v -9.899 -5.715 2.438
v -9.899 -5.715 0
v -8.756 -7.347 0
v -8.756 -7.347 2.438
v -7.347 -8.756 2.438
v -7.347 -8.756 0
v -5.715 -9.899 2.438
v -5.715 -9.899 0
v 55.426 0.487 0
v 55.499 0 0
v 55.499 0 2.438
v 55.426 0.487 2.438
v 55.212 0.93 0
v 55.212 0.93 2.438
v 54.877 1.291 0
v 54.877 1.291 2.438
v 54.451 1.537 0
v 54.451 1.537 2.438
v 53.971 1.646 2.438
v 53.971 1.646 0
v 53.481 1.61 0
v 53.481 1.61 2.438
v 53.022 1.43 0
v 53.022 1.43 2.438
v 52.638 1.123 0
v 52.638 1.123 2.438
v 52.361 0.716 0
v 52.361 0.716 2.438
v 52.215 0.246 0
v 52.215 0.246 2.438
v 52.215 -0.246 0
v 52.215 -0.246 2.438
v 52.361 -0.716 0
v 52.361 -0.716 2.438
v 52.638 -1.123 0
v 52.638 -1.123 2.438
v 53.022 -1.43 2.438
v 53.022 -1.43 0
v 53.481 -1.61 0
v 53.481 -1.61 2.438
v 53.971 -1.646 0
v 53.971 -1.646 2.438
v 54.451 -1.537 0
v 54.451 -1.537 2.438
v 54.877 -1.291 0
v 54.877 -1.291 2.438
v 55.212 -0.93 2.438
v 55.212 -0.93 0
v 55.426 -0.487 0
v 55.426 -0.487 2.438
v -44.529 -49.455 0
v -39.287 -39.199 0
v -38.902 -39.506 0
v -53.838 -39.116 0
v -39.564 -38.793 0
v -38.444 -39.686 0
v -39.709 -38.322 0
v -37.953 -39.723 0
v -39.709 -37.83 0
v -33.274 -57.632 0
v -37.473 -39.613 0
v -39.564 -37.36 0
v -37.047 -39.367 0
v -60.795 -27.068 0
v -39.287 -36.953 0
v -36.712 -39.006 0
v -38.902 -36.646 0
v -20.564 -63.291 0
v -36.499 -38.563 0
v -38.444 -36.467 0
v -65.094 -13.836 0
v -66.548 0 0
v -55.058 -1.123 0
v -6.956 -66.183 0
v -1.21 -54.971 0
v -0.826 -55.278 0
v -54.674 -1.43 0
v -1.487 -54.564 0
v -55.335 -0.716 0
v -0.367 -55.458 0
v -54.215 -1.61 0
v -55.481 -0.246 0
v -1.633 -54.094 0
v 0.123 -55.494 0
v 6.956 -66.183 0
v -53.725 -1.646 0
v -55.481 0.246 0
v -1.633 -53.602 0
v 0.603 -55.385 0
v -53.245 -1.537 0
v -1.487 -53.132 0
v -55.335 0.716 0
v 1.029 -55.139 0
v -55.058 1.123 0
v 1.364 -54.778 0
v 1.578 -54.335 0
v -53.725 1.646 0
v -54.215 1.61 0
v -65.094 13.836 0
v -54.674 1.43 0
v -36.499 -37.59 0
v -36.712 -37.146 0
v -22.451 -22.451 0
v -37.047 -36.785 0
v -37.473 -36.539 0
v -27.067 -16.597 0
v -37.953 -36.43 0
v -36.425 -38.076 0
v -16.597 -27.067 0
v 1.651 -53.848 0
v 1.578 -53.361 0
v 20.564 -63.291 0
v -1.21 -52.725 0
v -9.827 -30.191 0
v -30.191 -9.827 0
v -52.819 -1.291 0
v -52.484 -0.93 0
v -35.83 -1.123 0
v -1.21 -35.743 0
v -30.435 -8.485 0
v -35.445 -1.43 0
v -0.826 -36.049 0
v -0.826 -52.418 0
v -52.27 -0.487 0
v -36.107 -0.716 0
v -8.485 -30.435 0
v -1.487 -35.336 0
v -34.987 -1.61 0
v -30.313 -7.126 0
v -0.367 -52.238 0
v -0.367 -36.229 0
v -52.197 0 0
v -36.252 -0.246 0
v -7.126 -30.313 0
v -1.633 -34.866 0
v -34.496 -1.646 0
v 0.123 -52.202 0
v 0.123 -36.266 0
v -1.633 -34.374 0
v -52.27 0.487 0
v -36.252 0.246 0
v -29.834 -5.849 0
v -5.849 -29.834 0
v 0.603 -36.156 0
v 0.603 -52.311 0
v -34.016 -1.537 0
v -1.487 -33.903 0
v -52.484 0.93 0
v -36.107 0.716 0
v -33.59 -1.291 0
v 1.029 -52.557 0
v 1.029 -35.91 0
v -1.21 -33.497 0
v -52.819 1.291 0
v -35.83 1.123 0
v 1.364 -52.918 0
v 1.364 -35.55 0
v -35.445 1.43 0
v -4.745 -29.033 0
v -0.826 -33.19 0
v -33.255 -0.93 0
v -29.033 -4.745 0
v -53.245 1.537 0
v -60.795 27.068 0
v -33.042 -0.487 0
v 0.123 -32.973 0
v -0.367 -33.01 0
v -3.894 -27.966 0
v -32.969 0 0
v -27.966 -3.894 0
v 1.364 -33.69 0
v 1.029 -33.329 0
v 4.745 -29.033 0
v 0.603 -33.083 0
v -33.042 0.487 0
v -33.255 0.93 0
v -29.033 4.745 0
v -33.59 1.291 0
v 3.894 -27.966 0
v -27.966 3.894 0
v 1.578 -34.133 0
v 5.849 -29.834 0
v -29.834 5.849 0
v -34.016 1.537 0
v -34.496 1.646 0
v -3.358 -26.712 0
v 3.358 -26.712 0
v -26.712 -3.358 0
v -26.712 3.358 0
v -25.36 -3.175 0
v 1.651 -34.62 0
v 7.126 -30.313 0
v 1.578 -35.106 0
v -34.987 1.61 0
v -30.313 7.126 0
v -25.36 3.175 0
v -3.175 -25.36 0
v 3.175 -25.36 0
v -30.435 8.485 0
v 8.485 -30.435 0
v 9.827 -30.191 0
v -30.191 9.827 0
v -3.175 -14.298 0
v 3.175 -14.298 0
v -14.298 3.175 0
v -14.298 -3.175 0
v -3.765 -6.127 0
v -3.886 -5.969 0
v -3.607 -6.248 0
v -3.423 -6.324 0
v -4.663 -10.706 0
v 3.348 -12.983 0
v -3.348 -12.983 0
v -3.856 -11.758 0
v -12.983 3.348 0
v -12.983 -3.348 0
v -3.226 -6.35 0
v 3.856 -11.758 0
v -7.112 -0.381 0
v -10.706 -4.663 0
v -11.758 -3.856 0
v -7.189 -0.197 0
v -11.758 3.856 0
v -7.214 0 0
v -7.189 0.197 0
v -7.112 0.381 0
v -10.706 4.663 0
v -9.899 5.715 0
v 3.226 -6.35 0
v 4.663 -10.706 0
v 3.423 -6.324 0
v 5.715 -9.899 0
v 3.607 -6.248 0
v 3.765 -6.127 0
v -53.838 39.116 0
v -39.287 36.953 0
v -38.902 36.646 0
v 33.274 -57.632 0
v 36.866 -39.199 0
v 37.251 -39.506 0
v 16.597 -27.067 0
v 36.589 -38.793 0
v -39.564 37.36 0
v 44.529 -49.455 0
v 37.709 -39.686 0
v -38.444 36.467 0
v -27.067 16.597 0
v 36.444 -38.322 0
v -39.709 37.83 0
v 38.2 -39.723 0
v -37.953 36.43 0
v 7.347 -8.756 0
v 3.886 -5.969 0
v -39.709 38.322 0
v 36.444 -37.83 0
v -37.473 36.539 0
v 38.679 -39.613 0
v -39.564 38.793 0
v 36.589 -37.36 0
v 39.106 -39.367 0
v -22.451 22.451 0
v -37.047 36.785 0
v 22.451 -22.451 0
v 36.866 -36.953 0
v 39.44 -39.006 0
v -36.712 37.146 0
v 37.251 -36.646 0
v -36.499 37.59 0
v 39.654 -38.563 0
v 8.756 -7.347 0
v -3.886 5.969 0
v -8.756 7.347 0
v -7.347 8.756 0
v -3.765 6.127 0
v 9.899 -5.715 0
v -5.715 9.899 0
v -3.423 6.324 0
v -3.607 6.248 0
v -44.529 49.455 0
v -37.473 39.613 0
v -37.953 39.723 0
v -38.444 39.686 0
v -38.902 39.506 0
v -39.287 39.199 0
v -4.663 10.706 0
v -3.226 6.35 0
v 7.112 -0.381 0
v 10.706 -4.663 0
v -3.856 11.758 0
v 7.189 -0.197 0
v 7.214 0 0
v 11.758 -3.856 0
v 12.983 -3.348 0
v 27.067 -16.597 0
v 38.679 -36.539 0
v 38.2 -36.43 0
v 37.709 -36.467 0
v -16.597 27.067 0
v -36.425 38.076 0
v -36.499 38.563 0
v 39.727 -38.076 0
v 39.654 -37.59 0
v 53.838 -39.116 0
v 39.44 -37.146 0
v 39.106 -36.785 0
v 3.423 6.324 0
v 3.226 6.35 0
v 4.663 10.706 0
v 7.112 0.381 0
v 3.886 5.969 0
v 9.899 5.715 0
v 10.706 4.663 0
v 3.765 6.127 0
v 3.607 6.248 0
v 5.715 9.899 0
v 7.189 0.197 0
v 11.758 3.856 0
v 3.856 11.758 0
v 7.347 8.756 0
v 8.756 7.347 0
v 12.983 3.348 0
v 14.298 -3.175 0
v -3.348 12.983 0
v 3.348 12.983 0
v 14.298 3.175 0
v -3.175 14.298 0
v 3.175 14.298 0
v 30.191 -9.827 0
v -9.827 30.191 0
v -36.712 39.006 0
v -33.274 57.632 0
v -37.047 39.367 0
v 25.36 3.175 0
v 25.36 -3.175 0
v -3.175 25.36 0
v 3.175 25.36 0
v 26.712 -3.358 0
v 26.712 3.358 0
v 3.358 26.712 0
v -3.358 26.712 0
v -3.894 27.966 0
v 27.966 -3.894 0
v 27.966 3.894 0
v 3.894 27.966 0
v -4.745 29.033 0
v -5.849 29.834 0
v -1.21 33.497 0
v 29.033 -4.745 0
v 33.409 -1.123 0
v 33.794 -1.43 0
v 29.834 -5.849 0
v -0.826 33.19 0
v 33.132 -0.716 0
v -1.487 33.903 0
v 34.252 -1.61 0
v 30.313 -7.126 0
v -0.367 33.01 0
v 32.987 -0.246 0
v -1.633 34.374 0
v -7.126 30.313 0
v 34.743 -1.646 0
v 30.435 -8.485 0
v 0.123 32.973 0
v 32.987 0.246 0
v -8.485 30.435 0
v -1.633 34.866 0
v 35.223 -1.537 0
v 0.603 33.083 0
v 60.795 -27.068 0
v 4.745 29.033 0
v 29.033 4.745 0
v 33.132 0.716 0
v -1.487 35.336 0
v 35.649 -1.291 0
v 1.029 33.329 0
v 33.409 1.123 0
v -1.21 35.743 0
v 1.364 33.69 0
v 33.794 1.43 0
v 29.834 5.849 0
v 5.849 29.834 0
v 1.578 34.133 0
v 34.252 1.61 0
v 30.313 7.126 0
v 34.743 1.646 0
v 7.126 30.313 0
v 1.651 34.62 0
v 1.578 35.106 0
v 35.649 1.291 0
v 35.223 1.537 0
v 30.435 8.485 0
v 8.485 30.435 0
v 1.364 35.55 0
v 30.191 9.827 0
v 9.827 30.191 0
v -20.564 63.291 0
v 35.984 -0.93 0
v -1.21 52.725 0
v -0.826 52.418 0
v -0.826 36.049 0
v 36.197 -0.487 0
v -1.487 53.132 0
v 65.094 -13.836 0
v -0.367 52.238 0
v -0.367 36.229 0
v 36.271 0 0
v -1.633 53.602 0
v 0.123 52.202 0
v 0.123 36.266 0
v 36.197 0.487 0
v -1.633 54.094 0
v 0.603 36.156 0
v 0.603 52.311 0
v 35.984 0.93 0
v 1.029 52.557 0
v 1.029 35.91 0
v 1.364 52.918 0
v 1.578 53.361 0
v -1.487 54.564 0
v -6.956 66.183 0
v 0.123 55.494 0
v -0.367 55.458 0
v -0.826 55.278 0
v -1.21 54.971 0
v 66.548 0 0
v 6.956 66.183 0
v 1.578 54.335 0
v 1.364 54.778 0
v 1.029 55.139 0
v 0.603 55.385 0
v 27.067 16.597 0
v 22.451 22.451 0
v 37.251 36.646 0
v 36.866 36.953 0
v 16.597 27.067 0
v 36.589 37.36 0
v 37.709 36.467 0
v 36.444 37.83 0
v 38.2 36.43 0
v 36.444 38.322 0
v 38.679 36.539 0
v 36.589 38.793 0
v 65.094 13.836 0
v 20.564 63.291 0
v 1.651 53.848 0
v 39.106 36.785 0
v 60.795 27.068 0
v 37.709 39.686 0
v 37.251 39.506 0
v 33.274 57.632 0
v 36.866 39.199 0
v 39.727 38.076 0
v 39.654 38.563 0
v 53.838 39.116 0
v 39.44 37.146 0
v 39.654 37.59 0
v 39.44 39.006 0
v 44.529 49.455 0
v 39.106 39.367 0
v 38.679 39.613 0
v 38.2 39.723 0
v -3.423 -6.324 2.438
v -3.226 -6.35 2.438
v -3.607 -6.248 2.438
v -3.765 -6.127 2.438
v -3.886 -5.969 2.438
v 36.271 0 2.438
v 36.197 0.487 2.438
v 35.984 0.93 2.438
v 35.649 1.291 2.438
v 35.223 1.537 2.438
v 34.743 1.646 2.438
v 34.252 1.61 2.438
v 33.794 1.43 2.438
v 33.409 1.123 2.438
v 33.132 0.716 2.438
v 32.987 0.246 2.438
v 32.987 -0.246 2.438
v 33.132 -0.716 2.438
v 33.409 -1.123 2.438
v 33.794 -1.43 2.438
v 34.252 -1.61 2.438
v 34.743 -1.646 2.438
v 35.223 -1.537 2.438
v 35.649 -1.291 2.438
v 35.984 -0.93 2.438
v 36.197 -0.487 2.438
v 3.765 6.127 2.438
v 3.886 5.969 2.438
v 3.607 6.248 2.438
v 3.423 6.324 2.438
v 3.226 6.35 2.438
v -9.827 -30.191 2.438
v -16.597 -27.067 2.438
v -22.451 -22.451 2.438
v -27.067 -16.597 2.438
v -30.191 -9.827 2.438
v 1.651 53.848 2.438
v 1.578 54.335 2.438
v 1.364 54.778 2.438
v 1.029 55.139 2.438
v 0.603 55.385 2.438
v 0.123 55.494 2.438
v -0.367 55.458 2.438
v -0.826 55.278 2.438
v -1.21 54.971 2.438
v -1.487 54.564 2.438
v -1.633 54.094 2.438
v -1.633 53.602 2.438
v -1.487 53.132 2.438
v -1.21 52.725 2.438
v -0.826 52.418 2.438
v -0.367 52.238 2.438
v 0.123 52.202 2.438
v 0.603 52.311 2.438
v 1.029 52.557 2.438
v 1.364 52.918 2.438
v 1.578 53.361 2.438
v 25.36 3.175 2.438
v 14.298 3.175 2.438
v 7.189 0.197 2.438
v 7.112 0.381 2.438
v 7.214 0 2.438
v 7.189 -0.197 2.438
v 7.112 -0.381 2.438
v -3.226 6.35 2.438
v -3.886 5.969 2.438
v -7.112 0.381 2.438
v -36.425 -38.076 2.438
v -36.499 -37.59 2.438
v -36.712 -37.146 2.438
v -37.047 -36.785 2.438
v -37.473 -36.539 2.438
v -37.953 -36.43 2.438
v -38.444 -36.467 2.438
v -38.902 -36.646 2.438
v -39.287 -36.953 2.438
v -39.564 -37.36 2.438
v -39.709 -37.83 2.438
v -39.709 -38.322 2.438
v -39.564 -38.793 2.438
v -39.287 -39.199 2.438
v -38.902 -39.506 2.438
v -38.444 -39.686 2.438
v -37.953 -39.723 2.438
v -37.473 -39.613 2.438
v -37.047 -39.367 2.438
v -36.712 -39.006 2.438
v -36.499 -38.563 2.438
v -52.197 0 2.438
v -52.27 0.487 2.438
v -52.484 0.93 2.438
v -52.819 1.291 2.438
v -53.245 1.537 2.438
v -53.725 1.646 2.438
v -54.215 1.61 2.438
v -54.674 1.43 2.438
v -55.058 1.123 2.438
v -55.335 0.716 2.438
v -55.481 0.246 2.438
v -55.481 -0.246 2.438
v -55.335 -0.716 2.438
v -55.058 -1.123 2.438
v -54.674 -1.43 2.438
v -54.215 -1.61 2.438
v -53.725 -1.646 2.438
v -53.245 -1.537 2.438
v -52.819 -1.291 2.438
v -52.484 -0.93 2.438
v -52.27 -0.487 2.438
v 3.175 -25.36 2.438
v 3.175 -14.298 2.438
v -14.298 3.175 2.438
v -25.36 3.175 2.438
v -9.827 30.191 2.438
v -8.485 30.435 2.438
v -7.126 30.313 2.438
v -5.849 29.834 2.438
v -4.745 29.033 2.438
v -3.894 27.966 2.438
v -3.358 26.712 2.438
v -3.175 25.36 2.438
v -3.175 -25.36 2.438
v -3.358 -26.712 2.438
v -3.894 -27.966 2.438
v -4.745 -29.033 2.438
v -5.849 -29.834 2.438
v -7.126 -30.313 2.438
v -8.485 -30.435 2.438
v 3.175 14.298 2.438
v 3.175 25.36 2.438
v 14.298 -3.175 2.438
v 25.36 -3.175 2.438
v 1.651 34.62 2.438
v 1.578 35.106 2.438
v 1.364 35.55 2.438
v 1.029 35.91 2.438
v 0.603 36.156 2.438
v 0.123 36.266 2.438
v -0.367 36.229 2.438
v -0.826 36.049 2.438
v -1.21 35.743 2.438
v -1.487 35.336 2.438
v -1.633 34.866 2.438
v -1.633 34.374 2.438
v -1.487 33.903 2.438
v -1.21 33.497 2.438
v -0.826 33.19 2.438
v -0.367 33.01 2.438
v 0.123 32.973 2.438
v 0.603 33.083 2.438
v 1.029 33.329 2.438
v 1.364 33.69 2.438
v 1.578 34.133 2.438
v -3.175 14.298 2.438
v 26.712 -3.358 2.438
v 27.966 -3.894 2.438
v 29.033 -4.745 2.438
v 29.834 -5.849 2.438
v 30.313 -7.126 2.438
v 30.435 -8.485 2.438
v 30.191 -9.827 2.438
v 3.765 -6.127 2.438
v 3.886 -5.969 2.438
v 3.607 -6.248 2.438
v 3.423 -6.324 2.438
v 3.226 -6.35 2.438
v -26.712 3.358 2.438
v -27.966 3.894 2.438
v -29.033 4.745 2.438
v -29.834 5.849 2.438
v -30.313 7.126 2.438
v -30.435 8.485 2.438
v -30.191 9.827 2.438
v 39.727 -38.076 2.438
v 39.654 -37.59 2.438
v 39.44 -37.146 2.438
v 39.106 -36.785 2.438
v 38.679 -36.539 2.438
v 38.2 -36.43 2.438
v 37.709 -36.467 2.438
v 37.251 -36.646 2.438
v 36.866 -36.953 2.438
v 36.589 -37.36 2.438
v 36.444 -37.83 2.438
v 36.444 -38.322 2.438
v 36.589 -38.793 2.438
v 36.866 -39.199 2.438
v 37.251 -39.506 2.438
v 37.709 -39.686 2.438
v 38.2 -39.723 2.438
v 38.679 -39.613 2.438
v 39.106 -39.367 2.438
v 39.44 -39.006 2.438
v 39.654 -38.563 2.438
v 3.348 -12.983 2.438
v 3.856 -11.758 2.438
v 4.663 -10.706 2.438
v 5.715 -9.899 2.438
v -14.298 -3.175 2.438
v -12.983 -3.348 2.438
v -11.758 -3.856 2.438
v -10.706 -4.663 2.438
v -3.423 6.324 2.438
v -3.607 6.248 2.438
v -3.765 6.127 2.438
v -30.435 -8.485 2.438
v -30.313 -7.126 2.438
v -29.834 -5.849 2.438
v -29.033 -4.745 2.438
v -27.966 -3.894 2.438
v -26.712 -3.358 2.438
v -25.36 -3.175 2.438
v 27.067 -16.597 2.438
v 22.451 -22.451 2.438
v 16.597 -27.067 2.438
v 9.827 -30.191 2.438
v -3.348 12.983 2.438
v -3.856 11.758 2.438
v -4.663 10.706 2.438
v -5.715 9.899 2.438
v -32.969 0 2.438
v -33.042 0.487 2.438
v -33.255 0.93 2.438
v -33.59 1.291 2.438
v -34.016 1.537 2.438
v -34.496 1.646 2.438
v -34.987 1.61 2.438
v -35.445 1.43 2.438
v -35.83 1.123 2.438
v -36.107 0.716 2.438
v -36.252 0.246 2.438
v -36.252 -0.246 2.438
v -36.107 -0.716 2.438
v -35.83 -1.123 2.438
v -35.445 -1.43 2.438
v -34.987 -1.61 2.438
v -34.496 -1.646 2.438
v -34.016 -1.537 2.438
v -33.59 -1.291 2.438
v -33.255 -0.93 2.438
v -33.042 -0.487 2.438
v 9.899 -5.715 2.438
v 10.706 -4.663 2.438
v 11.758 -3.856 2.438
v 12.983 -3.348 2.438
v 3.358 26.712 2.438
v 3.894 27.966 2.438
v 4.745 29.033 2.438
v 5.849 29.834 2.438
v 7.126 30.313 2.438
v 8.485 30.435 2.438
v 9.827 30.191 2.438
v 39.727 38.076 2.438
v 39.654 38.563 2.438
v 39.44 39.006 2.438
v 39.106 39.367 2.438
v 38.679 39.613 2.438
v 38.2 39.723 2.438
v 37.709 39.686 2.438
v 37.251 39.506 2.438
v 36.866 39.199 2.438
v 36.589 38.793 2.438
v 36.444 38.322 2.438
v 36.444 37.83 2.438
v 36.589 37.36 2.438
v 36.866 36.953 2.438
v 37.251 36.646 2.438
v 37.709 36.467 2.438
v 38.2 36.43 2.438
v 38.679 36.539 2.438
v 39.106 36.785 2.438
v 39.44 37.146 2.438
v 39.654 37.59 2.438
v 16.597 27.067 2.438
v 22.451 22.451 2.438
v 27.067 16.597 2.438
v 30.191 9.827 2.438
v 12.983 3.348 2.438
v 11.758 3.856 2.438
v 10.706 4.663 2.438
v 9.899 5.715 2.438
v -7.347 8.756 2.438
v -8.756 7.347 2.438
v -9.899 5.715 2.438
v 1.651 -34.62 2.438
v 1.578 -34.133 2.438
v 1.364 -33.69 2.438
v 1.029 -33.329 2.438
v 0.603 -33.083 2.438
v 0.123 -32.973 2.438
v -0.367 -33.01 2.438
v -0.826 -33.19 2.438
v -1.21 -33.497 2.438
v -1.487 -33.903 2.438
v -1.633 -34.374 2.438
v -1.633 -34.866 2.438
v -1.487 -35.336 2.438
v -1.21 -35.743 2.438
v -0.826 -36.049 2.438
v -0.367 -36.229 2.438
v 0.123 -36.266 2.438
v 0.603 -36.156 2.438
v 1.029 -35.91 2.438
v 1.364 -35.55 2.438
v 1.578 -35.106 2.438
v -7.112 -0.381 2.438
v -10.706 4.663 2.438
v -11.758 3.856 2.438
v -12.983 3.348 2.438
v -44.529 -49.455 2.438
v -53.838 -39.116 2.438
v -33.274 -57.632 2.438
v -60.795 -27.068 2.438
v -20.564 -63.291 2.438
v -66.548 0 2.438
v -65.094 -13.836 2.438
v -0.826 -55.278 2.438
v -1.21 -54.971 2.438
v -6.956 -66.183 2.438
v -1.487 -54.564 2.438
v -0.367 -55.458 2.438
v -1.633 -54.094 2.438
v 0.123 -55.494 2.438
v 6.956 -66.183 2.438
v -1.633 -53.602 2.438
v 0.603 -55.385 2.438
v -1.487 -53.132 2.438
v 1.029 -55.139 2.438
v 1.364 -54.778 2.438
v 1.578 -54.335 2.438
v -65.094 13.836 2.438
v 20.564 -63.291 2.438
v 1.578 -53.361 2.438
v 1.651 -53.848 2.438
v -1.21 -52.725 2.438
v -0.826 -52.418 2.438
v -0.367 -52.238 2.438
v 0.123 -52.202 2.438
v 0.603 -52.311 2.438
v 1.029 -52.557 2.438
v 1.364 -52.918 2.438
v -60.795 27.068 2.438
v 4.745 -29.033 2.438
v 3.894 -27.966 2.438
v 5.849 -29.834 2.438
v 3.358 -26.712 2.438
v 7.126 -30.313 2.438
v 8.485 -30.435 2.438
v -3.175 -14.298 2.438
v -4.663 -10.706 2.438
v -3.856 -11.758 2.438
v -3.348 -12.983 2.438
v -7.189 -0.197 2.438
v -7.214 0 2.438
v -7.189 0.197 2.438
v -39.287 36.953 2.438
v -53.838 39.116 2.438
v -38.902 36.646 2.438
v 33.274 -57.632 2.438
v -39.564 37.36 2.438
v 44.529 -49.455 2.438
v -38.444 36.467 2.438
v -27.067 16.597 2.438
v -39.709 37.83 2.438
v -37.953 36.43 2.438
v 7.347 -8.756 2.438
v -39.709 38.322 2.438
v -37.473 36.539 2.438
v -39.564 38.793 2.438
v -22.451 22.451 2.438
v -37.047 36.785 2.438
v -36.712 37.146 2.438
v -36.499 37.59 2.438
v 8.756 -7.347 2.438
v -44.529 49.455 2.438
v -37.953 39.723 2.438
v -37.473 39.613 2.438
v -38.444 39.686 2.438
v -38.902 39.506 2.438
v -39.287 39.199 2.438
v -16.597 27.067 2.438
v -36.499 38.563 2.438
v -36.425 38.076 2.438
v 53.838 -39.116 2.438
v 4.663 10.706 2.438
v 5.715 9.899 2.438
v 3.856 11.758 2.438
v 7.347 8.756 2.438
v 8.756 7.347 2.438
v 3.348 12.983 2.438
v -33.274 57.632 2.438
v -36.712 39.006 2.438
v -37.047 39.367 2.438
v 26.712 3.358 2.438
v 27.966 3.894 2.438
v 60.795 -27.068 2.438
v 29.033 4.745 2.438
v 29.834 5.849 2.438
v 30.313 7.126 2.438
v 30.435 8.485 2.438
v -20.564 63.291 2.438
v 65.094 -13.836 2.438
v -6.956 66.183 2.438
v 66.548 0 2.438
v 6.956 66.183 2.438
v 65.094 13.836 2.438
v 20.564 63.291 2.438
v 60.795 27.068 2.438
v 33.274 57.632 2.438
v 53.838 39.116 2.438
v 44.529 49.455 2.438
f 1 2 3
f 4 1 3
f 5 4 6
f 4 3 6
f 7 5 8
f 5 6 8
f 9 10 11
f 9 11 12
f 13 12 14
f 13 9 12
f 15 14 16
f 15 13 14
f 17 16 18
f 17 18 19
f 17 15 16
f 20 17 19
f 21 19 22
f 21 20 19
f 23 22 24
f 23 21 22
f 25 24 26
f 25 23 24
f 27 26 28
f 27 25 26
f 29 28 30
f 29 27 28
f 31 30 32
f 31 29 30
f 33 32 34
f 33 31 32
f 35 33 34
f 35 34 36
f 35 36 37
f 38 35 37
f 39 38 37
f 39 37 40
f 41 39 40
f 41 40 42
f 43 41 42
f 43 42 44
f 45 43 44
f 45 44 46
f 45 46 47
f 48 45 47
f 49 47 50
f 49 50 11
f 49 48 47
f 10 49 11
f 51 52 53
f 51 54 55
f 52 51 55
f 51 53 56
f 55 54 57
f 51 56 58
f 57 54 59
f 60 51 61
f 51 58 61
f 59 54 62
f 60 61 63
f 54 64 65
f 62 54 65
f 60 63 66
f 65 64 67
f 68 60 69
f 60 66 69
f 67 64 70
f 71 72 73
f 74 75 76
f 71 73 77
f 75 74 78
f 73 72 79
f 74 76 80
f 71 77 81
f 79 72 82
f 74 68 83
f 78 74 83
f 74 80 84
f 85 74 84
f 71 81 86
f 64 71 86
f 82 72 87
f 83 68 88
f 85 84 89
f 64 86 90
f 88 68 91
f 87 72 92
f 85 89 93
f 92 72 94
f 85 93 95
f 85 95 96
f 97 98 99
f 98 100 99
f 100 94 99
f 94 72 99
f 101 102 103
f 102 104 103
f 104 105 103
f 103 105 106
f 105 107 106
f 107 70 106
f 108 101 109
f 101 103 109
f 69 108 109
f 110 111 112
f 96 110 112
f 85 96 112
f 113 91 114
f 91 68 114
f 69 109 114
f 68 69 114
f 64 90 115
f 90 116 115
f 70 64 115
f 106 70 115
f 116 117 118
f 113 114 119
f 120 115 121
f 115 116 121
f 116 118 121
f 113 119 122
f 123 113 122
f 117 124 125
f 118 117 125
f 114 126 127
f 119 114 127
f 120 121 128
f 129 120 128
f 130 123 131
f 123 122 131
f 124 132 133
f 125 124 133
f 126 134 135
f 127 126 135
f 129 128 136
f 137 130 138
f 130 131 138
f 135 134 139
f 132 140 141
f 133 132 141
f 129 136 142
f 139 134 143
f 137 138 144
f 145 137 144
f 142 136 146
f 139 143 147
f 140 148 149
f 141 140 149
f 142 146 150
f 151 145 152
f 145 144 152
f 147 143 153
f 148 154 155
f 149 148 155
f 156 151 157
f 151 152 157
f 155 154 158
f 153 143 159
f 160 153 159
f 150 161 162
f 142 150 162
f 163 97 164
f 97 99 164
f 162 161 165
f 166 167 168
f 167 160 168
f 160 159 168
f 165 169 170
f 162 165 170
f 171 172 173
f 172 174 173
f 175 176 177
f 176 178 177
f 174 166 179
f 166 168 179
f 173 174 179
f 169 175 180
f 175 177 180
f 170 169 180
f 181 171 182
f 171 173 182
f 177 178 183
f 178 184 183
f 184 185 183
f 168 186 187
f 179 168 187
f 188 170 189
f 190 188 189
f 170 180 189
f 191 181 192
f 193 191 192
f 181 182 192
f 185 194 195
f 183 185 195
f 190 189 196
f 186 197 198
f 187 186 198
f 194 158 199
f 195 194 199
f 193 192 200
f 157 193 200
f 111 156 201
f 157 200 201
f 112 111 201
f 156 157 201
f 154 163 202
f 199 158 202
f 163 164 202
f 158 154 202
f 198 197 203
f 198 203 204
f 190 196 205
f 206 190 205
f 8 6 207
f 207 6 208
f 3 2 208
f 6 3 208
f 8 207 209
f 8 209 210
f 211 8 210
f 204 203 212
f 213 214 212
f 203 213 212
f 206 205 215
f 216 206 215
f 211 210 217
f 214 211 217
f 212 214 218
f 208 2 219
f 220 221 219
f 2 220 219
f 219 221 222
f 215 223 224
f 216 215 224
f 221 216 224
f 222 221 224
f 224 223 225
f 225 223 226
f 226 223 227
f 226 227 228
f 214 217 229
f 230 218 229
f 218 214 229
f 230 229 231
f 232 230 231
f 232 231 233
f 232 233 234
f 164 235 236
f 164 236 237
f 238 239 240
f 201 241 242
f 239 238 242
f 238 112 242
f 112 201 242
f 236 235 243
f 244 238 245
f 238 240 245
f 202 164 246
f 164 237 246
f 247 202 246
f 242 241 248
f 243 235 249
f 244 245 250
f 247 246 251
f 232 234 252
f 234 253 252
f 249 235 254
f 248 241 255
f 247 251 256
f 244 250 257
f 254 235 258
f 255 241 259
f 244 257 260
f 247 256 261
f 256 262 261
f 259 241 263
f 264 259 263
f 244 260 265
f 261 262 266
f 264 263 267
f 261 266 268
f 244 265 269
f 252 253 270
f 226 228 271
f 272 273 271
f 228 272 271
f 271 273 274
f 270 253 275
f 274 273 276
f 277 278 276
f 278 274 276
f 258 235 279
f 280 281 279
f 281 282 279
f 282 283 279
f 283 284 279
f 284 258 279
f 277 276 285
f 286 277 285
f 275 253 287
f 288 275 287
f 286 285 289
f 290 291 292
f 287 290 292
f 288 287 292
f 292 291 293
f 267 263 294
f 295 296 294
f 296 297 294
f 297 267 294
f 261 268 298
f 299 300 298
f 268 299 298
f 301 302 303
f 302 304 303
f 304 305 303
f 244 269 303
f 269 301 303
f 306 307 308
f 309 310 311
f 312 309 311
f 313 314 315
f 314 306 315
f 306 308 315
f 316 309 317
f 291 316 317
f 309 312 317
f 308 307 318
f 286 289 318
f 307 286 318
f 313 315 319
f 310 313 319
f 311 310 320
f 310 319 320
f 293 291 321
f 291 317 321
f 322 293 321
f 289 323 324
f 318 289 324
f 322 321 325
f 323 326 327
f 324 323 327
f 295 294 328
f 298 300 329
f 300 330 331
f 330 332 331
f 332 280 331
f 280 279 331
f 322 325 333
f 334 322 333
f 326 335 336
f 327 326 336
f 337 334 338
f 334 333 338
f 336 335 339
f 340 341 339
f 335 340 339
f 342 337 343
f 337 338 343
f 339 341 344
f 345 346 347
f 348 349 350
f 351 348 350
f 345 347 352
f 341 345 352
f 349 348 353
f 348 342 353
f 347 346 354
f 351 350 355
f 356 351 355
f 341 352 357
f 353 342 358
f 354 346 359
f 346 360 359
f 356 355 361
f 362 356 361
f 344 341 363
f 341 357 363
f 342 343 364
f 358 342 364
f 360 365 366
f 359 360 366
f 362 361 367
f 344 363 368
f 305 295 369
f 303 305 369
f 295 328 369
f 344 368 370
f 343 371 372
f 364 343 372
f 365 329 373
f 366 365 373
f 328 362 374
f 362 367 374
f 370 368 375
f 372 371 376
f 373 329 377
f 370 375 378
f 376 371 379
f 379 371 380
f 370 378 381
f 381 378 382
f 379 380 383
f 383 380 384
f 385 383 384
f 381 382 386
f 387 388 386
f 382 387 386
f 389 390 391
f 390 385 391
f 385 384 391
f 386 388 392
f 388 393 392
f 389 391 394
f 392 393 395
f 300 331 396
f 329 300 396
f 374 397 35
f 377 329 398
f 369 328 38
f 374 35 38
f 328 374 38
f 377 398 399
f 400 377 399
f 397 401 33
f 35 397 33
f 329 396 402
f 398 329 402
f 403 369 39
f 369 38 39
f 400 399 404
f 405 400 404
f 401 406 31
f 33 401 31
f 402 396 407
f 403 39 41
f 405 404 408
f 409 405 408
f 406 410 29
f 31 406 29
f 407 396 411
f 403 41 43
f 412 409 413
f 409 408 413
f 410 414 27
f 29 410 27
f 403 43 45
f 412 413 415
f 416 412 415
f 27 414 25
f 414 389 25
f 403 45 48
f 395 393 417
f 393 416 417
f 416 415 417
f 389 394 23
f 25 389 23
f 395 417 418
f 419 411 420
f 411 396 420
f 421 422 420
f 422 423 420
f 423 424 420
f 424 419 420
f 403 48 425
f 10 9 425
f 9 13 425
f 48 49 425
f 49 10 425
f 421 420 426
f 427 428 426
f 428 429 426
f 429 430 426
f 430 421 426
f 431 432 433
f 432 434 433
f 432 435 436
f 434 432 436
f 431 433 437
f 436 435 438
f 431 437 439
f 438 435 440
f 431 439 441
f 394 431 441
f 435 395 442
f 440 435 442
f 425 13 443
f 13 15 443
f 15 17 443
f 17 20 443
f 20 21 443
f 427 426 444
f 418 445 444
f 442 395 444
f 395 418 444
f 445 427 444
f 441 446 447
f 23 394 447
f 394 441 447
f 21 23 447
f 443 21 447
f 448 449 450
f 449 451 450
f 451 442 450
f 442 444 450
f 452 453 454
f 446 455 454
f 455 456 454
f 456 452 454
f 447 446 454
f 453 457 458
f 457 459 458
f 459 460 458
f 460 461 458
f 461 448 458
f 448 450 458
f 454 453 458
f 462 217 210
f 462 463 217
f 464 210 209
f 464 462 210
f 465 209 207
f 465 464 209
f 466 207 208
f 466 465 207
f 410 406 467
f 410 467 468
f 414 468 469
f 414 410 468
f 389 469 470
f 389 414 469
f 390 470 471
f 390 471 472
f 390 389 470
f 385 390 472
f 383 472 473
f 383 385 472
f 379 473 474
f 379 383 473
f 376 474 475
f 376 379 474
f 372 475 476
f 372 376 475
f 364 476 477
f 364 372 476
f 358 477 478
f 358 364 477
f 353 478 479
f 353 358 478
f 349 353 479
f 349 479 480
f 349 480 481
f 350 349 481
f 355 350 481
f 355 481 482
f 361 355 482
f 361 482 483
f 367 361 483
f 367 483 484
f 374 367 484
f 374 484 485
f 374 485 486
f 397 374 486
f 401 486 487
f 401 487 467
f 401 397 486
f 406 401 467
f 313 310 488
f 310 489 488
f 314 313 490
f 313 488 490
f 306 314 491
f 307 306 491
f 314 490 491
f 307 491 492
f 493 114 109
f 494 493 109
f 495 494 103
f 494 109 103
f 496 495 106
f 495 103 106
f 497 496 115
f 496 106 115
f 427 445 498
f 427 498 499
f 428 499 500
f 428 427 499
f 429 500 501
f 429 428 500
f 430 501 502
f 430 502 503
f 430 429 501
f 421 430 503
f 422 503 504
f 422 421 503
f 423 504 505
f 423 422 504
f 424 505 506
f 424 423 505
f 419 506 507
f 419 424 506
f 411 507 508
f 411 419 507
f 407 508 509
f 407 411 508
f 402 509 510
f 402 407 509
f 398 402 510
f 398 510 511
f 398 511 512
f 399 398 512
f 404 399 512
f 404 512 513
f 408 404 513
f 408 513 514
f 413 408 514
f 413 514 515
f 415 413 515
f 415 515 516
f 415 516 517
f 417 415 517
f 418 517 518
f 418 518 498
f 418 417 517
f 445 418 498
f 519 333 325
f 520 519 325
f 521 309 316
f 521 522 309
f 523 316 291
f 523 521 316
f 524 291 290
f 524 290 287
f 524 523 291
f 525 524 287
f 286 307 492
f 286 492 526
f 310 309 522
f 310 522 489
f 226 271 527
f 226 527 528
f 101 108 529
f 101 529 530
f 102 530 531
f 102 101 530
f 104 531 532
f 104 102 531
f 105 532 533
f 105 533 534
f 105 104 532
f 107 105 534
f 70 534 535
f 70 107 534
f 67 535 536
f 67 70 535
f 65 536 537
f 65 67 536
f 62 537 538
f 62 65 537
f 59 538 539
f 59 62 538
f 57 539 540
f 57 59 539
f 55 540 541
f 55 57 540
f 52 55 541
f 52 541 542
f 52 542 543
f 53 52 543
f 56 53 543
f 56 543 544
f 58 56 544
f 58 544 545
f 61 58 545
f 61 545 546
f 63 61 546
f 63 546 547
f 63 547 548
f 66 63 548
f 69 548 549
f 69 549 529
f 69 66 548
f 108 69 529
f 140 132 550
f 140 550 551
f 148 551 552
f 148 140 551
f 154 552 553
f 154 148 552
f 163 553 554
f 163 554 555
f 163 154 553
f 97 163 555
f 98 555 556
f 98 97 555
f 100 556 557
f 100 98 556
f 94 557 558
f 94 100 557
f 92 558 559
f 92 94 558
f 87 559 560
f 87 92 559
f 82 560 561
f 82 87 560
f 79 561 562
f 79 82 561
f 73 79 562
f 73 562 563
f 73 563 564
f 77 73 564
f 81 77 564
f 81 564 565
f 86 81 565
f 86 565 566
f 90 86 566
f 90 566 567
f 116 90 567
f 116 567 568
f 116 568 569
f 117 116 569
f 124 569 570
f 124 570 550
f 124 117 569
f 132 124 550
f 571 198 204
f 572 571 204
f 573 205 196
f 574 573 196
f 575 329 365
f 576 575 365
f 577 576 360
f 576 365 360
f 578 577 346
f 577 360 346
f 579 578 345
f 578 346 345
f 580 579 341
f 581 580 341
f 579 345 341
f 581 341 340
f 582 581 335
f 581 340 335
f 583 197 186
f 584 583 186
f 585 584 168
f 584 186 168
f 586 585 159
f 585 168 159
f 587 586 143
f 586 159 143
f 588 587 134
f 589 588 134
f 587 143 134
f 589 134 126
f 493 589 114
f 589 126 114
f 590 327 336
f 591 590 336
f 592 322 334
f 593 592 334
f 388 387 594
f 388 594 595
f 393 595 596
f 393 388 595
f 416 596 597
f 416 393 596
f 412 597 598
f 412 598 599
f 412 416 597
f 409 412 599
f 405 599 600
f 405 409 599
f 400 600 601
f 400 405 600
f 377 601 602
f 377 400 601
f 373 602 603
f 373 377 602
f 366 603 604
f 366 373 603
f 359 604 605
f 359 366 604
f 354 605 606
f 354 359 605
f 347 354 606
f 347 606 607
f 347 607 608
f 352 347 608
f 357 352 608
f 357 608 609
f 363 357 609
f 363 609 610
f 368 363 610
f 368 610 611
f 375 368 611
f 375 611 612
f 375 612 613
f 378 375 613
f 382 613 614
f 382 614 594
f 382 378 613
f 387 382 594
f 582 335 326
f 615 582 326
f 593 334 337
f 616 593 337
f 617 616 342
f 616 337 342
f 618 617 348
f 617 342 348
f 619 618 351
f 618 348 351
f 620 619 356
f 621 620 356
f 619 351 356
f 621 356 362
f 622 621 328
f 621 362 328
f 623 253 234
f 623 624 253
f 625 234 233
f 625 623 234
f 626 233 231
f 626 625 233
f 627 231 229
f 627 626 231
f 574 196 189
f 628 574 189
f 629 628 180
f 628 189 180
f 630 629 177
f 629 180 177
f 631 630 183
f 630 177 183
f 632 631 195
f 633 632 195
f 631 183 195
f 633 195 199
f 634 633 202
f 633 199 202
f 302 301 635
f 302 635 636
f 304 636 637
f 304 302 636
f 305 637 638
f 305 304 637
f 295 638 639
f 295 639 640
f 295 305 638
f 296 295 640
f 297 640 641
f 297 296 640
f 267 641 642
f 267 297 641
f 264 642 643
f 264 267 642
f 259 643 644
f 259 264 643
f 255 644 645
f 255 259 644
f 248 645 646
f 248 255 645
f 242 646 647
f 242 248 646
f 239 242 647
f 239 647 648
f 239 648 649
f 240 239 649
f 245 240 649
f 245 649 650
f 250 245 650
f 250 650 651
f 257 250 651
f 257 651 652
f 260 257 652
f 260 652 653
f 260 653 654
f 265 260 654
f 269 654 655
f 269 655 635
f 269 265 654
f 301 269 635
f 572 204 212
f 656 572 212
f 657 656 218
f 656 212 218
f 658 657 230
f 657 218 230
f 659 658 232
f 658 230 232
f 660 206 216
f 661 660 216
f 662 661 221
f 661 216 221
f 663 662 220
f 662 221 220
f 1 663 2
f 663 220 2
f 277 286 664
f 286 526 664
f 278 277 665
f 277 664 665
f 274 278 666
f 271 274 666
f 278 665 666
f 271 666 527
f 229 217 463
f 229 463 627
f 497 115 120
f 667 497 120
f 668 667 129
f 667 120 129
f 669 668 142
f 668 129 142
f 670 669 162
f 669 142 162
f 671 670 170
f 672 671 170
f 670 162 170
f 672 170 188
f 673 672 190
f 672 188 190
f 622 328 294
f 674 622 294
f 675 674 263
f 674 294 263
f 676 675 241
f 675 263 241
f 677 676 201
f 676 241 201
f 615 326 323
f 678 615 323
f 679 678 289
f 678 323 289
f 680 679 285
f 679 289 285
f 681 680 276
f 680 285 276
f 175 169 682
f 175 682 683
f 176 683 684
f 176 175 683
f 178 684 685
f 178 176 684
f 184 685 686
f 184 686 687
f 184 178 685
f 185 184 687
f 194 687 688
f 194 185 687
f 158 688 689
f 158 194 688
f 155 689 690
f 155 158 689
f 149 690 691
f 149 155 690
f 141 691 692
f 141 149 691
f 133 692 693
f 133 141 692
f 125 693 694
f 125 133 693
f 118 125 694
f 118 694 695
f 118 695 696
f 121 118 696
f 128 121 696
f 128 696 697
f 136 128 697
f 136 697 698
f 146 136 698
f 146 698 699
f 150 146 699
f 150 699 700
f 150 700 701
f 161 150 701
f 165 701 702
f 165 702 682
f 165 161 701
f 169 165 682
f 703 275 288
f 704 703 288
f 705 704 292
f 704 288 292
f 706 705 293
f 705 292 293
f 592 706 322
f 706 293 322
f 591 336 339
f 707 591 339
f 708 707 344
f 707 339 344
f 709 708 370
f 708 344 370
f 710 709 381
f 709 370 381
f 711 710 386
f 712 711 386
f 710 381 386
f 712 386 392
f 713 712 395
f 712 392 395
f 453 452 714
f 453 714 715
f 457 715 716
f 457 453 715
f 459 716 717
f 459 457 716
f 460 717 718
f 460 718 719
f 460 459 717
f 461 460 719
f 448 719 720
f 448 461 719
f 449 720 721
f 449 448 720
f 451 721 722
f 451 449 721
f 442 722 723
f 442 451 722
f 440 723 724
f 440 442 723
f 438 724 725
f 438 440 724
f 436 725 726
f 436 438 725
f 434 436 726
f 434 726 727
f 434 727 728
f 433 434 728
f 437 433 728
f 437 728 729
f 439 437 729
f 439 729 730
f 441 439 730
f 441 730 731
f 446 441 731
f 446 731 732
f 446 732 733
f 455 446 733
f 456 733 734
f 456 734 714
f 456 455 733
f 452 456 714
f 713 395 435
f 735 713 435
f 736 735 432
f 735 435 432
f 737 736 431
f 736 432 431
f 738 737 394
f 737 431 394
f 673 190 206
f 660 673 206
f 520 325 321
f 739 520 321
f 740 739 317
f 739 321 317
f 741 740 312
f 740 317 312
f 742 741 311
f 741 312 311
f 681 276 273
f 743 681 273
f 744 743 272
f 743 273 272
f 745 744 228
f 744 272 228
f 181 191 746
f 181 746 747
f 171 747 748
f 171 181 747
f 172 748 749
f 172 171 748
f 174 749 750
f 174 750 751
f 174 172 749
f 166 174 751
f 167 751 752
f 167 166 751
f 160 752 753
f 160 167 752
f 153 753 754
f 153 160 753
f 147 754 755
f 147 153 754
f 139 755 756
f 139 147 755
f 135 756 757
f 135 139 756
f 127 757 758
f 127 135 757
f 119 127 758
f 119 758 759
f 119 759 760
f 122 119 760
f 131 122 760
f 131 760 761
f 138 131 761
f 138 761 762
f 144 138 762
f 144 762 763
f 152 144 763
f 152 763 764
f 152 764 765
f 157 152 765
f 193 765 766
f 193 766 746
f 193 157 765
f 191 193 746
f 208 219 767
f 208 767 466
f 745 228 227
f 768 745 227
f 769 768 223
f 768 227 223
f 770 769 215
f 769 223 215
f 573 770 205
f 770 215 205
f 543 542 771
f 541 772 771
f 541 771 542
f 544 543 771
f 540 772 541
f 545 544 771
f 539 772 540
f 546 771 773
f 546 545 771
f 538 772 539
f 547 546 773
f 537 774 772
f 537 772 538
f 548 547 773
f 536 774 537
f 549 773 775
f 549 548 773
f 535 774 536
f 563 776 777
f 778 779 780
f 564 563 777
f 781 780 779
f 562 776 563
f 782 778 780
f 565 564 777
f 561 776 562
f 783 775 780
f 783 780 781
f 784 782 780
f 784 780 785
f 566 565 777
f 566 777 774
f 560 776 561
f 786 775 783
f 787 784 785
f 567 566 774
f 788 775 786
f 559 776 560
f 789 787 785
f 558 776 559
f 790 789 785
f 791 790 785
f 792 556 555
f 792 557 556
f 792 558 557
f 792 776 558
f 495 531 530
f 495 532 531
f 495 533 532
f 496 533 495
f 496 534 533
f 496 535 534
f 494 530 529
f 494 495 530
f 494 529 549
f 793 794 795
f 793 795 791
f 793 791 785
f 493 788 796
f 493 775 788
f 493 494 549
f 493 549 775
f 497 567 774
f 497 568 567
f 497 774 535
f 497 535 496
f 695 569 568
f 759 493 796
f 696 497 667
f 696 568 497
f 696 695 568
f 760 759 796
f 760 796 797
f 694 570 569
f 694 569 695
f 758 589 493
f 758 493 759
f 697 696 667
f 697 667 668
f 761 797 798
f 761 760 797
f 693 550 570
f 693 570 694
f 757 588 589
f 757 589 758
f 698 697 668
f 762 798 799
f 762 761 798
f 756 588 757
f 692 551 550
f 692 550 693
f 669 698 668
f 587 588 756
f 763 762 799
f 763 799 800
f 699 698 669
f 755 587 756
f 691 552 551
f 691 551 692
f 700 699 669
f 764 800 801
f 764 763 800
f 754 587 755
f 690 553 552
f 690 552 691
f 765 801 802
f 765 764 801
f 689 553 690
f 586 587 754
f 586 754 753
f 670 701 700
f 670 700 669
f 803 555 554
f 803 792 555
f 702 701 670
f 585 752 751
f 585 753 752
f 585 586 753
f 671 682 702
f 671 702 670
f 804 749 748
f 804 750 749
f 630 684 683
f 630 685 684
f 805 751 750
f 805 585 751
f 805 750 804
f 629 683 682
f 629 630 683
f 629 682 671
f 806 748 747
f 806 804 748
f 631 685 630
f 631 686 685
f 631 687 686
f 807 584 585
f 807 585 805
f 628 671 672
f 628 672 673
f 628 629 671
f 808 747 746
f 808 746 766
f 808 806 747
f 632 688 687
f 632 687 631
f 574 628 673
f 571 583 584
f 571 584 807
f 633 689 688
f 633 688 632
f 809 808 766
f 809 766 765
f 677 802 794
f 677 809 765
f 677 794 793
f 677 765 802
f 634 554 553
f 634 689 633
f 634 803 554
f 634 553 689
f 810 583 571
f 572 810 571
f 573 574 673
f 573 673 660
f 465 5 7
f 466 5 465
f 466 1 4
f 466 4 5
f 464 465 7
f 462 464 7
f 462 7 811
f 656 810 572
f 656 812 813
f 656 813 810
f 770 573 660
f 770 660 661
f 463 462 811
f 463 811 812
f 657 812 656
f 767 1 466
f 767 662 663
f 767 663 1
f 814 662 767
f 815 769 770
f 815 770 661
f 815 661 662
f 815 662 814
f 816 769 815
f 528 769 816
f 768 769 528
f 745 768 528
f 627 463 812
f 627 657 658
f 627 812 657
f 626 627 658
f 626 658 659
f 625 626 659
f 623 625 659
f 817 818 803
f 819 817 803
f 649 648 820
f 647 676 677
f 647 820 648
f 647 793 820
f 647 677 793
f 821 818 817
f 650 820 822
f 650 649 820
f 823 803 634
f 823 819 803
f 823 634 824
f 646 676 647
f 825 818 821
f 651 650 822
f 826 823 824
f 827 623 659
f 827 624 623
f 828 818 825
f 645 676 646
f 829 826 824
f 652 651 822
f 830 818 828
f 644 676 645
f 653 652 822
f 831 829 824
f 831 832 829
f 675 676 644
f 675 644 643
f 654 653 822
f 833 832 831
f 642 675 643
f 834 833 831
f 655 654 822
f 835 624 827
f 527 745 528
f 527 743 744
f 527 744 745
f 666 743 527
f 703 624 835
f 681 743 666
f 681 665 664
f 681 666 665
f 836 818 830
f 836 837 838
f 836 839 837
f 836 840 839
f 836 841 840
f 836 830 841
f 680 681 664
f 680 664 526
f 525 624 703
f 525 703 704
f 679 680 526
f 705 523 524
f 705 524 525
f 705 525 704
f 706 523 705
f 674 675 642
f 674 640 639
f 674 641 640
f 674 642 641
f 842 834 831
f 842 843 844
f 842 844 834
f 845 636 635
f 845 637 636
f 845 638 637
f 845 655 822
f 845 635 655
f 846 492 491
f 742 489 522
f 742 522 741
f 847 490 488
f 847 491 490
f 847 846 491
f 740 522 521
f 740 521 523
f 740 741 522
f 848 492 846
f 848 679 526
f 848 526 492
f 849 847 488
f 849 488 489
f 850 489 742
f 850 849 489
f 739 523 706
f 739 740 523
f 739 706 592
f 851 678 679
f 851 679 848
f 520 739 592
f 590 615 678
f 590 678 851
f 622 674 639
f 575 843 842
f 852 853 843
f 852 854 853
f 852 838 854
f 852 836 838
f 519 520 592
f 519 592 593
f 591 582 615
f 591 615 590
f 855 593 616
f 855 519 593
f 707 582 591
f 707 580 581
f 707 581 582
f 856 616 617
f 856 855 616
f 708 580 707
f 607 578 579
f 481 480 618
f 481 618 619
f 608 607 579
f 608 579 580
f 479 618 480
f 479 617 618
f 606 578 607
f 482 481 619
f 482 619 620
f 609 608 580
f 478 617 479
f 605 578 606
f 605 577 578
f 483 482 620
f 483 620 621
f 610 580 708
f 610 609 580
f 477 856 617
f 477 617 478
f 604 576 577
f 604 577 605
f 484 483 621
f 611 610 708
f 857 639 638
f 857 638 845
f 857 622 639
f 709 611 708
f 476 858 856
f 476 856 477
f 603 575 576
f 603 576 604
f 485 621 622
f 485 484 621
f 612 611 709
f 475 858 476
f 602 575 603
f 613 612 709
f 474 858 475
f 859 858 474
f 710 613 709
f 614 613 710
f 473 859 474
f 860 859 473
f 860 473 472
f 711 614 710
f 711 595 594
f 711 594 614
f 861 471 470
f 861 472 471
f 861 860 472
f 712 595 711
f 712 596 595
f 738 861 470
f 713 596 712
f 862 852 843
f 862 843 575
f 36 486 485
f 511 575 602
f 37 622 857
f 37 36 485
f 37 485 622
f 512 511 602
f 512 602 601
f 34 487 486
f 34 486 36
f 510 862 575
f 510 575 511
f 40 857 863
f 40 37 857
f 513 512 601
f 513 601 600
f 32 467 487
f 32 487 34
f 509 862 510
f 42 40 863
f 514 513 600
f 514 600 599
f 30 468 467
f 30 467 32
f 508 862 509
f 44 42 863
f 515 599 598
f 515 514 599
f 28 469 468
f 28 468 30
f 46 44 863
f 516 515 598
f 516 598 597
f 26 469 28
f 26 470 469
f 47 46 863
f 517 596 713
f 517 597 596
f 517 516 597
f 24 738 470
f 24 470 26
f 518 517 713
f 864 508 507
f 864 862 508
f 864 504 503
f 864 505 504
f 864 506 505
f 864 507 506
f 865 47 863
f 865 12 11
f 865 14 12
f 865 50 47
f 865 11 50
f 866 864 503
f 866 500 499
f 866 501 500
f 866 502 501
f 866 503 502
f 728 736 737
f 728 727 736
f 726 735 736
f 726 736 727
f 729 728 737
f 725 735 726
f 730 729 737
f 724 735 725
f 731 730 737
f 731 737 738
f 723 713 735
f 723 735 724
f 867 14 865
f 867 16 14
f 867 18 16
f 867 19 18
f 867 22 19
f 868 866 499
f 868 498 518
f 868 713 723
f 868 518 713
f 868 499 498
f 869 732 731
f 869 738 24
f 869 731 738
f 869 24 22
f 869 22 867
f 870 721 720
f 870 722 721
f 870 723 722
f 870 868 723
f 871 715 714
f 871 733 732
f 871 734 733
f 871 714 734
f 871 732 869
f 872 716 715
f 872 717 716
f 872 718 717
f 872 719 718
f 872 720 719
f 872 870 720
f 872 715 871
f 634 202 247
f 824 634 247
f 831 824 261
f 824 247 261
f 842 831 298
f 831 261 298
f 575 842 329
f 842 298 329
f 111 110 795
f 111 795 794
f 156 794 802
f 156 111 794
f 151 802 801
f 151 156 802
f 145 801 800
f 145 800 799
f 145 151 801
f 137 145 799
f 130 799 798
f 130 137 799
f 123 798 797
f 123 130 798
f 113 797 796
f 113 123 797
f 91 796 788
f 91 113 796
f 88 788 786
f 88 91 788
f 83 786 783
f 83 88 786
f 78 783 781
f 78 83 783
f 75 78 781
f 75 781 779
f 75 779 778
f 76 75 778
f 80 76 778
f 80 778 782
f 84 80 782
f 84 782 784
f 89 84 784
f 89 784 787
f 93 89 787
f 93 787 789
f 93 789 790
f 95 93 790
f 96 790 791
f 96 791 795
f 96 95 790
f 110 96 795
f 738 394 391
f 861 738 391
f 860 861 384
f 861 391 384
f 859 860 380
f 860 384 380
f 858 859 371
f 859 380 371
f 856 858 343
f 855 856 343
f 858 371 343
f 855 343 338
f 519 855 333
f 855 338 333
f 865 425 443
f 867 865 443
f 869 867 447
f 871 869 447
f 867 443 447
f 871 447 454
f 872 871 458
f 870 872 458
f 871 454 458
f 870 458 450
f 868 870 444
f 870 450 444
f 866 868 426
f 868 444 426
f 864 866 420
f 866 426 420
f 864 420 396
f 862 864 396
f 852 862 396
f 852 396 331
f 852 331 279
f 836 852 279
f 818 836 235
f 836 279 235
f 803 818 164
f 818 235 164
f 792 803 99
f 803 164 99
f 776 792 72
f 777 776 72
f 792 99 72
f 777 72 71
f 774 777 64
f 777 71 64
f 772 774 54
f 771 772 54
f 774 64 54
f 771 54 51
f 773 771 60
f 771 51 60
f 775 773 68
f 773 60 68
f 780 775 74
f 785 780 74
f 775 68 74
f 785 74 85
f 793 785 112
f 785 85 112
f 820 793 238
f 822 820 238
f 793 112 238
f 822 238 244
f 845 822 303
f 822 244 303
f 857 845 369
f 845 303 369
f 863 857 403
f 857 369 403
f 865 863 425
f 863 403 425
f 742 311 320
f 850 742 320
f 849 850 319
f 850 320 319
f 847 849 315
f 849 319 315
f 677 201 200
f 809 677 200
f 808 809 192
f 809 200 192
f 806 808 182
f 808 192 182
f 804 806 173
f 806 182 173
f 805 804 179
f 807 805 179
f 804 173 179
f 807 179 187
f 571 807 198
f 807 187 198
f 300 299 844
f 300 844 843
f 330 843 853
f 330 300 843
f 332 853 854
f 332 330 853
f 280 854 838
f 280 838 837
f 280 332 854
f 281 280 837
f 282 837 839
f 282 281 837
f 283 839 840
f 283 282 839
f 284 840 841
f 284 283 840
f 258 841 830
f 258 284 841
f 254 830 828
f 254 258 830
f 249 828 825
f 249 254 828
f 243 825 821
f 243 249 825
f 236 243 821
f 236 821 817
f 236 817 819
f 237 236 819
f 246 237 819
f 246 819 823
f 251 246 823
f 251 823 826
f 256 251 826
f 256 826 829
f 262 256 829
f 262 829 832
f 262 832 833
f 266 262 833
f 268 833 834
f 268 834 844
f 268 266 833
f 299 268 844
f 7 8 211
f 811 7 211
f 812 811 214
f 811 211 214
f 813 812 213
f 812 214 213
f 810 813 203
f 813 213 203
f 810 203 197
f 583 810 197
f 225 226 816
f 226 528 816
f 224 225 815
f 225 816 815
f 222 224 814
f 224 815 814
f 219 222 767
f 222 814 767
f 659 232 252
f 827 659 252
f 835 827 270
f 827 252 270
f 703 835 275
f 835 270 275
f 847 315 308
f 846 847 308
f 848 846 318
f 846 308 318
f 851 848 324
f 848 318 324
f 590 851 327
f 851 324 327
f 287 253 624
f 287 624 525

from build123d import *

# Parameters (mm, degrees)
SKETCH1_R           = 66.548
SKETCH1_R_2         = 1.651
BOSS_EXTRUDE1_DEPTH = 2.4384
FILLET6_R           = 0.762


with BuildPart() as part:
    # Sketch1 → Boss-Extrude1 (new body)
    with BuildSketch(Plane.XY):
        Circle(SKETCH1_R)
        with Locations((0, 53.848)):
            Circle(SKETCH1_R_2, mode=Mode.SUBTRACT)
        with Locations((0, 34.619591715)):
            Circle(SKETCH1_R_2, mode=Mode.SUBTRACT)
        with Locations((34.619591715, 0)):
            Circle(SKETCH1_R_2, mode=Mode.SUBTRACT)
        with Locations((0, -34.619591715)):
            Circle(SKETCH1_R_2, mode=Mode.SUBTRACT)
        with Locations((-34.619591715, 0)):
            Circle(SKETCH1_R_2, mode=Mode.SUBTRACT)
        with Locations((38.076285953, 38.076285953)):
            Circle(SKETCH1_R_2, mode=Mode.SUBTRACT)
        with Locations((53.848, 0)):
            Circle(SKETCH1_R_2, mode=Mode.SUBTRACT)
        with Locations((38.076285953, -38.076285953)):
            Circle(SKETCH1_R_2, mode=Mode.SUBTRACT)
        with Locations((0, -53.848)):
            Circle(SKETCH1_R_2, mode=Mode.SUBTRACT)
        with Locations((-38.076285953, -38.076285953)):
            Circle(SKETCH1_R_2, mode=Mode.SUBTRACT)
        with Locations((-53.848, 0)):
            Circle(SKETCH1_R_2, mode=Mode.SUBTRACT)
        with Locations((-38.076285953, 38.076285953)):
            Circle(SKETCH1_R_2, mode=Mode.SUBTRACT)
        with BuildLine():
            Line((25.360281446, 3.175), (14.298079416, 3.175))
            ThreePointArc((14.298079416, 3.175), (11.758079416, 3.855590949), (9.898670365, 5.715))
            ThreePointArc((9.898670365, 5.715), (8.082230509, 8.082230509), (5.715, 9.898670365))
            ThreePointArc((5.715, 9.898670365), (3.855590949, 11.758079416), (3.175, 14.298079416))
            Line((3.175, 14.298079416), (3.175, 25.360281446))
            ThreePointArc((3.175, 25.360281446), (5.270146171, 29.470883302), (9.827380952, 30.190811245))
            ThreePointArc((9.827380952, 30.190811245), (22.450640303, 22.450640303), (30.190811245, 9.827380952))
            ThreePointArc((30.190811245, 9.827380952), (29.470883302, 5.270146171), (25.360281446, 3.175))
        make_face(mode=Mode.SUBTRACT)
        with BuildLine():
            Line((-3.175, 25.360281446), (-3.175, 14.298079416))
            ThreePointArc((-3.175, 14.298079416), (-3.855590949, 11.758079416), (-5.715, 9.898670365))
            ThreePointArc((-5.715, 9.898670365), (-8.082230509, 8.082230509), (-9.898670365, 5.715))
            ThreePointArc((-9.898670365, 5.715), (-11.758079416, 3.855590949), (-14.298079416, 3.175))
            Line((-14.298079416, 3.175), (-25.360281446, 3.175))
            ThreePointArc((-25.360281446, 3.175), (-29.470883302, 5.270146171), (-30.190811245, 9.827380952))
            ThreePointArc((-30.190811245, 9.827380952), (-22.450640303, 22.450640303), (-9.827380952, 30.190811245))
            ThreePointArc((-9.827380952, 30.190811245), (-5.270146171, 29.470883302), (-3.175, 25.360281446))
        make_face(mode=Mode.SUBTRACT)
        with BuildLine():
            Line((3.175, -25.360281446), (3.175, -14.298079416))
            ThreePointArc((3.175, -14.298079416), (3.855590949, -11.758079416), (5.715, -9.898670365))
            ThreePointArc((5.715, -9.898670365), (8.082230509, -8.082230509), (9.898670365, -5.715))
            ThreePointArc((9.898670365, -5.715), (11.758079416, -3.855590949), (14.298079416, -3.175))
            Line((14.298079416, -3.175), (25.360281446, -3.175))
            ThreePointArc((25.360281446, -3.175), (29.470883302, -5.270146171), (30.190811245, -9.827380952))
            ThreePointArc((30.190811245, -9.827380952), (22.450640303, -22.450640303), (9.827380952, -30.190811245))
            ThreePointArc((9.827380952, -30.190811245), (5.270146171, -29.470883302), (3.175, -25.360281446))
        make_face(mode=Mode.SUBTRACT)
        Polygon((7.332348419, 0), (3.666174209, 6.35), (-3.666174209, 6.35), (-7.332348419, 0), (-3.666174209, -6.35), (3.666174209, -6.35), align=None, mode=Mode.SUBTRACT)
        with BuildLine():
            Line((-25.360281446, -3.175), (-14.298079416, -3.175))
            ThreePointArc((-14.298079416, -3.175), (-11.758079416, -3.855590949), (-9.898670365, -5.715))
            ThreePointArc((-9.898670365, -5.715), (-8.082230509, -8.082230509), (-5.715, -9.898670365))
            ThreePointArc((-5.715, -9.898670365), (-3.855590949, -11.758079416), (-3.175, -14.298079416))
            Line((-3.175, -14.298079416), (-3.175, -25.360281446))
            ThreePointArc((-3.175, -25.360281446), (-5.270146171, -29.470883302), (-9.827380952, -30.190811245))
            ThreePointArc((-9.827380952, -30.190811245), (-22.450640303, -22.450640303), (-30.190811245, -9.827380952))
            ThreePointArc((-30.190811245, -9.827380952), (-29.470883302, -5.270146171), (-25.360281446, -3.175))
        make_face(mode=Mode.SUBTRACT)
    extrude(amount=BOSS_EXTRUDE1_DEPTH)

    # Fillet6
    fillet6_edges = [part.edges().sort_by_distance(p)[0] for p in [
        (3.666174209, -6.35, 1.2192),
        (7.332348419, 0, 1.2192),
        (3.666174209, 6.35, 1.2192),
        (-3.666174209, 6.35, 1.2192),
        (-7.332348419, 0, 1.2192),
        (-3.666174209, -6.35, 1.2192),
    ]]
    fillet(fillet6_edges, radius=FILLET6_R)


solid = part.part
